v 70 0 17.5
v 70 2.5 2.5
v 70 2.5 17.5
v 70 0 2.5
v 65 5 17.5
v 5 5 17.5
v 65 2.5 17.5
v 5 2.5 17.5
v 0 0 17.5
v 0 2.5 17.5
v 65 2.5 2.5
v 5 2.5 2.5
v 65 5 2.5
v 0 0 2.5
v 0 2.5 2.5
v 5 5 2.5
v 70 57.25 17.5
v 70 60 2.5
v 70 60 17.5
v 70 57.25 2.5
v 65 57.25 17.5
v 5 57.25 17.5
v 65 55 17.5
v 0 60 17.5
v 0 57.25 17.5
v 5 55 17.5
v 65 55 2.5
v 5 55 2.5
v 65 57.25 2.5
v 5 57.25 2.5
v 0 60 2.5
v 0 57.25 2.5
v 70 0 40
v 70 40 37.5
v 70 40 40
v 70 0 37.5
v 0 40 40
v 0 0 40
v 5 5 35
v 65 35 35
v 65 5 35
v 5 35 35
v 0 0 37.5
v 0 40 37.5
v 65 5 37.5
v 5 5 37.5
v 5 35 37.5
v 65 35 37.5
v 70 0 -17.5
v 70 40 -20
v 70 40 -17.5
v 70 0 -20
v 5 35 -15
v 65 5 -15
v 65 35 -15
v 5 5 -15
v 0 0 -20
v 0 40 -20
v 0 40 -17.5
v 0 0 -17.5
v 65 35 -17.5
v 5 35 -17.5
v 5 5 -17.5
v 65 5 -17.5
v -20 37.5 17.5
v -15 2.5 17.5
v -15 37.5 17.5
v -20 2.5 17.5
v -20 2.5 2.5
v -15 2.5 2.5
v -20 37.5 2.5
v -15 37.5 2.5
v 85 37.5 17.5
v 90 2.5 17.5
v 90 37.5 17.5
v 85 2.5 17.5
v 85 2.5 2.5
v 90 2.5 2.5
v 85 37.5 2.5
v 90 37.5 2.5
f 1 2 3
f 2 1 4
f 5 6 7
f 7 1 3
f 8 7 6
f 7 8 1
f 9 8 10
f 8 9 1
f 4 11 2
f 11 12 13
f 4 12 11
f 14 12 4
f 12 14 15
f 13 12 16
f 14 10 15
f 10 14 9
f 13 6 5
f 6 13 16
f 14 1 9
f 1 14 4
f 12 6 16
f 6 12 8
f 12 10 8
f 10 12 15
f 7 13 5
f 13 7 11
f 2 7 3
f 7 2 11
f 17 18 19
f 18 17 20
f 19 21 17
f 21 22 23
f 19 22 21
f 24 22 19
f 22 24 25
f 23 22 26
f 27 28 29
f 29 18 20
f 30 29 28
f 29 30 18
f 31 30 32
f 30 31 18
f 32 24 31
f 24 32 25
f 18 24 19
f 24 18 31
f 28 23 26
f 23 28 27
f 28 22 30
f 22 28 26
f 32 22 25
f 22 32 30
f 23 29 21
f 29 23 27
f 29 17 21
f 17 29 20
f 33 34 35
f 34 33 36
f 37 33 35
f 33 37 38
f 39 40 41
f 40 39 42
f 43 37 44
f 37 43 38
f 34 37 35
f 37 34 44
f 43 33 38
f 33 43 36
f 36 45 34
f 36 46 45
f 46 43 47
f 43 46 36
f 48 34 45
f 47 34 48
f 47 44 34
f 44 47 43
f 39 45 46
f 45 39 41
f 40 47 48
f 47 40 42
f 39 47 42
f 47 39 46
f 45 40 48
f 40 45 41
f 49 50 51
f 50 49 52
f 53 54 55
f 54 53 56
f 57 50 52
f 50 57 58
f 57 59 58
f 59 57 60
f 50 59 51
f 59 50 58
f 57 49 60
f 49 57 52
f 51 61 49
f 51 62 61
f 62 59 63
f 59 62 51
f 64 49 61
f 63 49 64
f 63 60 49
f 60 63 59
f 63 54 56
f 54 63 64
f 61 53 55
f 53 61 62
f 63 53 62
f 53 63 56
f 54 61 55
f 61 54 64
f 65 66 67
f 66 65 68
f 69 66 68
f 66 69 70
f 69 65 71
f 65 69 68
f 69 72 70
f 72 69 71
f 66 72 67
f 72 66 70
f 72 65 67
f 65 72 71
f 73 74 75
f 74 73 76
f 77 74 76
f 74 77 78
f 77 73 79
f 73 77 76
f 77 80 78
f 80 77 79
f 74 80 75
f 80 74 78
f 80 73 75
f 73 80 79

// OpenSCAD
//Please use the Customizer to interact with this (if necessary, show it by clearing the checkbox in front of View | Hide Customizer), and close this Editor window.

/* [Overview] */
//Part
PARTNO = "0"; // [0:All, 1:Front, 2:Back, 3:Left Side, 4:Right Side, 5:Top, 6:Bottom,7:Dividers]

//Endmill Diameter
diameter=3.175;

//Part Spacing
partspacing=4;

/* [Size] */

//Thickness
thickness = 5;

//Width
width = 70;

//Height
height = 20;

//Length
length = 40;

conversionfactor = 1*1;

cwidth = width*conversionfactor;
clength = length*conversionfactor;
cheight = height*conversionfactor;
cthickness = thickness*conversionfactor;
cbottomlidthickness=thickness*conversionfactor;
cpartspacing=partspacing*conversionfactor*5;

cdiameter = diameter*conversionfactor;

cinteriorwidth = cwidth-cthickness*2;
cinteriorlength = clength-cthickness*2;

cinteriorheight=cheight-cbottomlidthickness*2-cthickness;

//Front
module Front() {difference() {
translate([0, 0, cthickness/2]) {    cube(size = [cwidth,cthickness,cheight-cthickness], center = false);}
translate([-cthickness*0.1,cthickness/2,cthickness*0.05])cube(size = [cthickness*1.1,cthickness/2*1.1,cheight], center = false);
translate([cwidth-cthickness,cthickness/2,cthickness*0.05])cube(size = [cthickness*1.1,cthickness/2*1.1,cheight], center = false);
}}

//Back
module Back() {translate([0, clength-cthickness+cpartspacing, cthickness/2]) {
    difference() {
    cube(size = [cwidth,cthickness,cheight-cthickness], center = false);
translate([-cthickness*0.1,-cthickness*0.1,-cthickness*0.05])cube(size = [cthickness*1.1,cthickness/2*1.1,cheight], center = false);
translate([cwidth-cthickness,-cthickness*0.1,-cthickness*0.05])cube(size = [cthickness*1.1,cthickness/2*1.1,cheight], center = false);
    }}}

//LeftSide
module LeftSide() {translate([cthickness-cpartspacing, cthickness/2, cthickness/2]) {
    rotate([0, 0, 90]) {
difference() {
    cube(size = [clength-cthickness,cthickness,cheight-cthickness], center = false);}}}}

//RightSide
module RightSide() {translate([cwidth+cpartspacing, cthickness/2, cthickness/2]) {
    rotate([0, 0, 90]) {
difference() {
    cube(size = [clength-cthickness,cthickness,cheight-cthickness], center = false);}}}}

//Top
module Top() {translate([cthickness-cbottomlidthickness, cthickness-cbottomlidthickness, cheight+cpartspacing-cthickness]) {difference() {
    cube(size = [cwidth-cthickness*2+cbottomlidthickness*2,clength-cthickness*2+cbottomlidthickness*2,cbottomlidthickness], center = false);
translate([-cthickness*0.1,-cthickness*0.1,-cthickness*0.05])cube(size = [cwidth*1.2,cthickness*1.1,cthickness*1.1/2], center = false);
translate([-cthickness*0.1,clength-cthickness,-cthickness*0.05])cube(size = [cwidth*1.2,cthickness*1.1,cthickness*1.1/2], center = false);
translate([-cthickness*0.1,-cthickness*0.1,-cthickness*0.05])cube(size = [cthickness*1.1,clength*1.2,cthickness*1.1/2], center = false);
translate([cwidth-cthickness,-cthickness*0.1,-cthickness*0.05])cube(size = [cthickness*1.1,clength*1.2,cthickness*1.1/2], center = false);
};
};
}

//Bottom
module Bottom() {translate([cthickness-cbottomlidthickness, cthickness-cbottomlidthickness, -cpartspacing]) {difference() {
    cube(size = [cwidth-cthickness*2+cbottomlidthickness*2,clength-cthickness*2+cbottomlidthickness*2,cbottomlidthickness], center = false);
translate([-cthickness*0.1,-cthickness*0.1,cthickness/2])cube(size = [cwidth*1.2,cthickness*1.1,cthickness*1.1/2], center = false);
translate([-cthickness*0.1,clength-cthickness,cthickness/2])cube(size = [cwidth*1.2,cthickness*1.1,cthickness*1.1/2], center = false);
translate([-cthickness*0.1,-cthickness*0.1,cthickness/2])cube(size = [cthickness*1.1,clength*1.2,cthickness*1.1/2], center = false);
translate([cwidth-cthickness,-cthickness*0.1,cthickness/2])cube(size = [cthickness*1.1,clength*1.2,cthickness*1.1/2], center = false);
};
};
};


// [0:All, 1:Front, 2:Back, 3:Left Side, 4:Right Side, 5:Top, 6:Bottom

 if (PARTNO == "1") Front();
 if (PARTNO == "2") Back();
 if (PARTNO == "3") LeftSide();
 if (PARTNO == "4") RightSide();
 if (PARTNO == "5") Top();
 if (PARTNO == "6") Bottom();
       
  // optionally use 0 for whole object
 if (PARTNO == "0") {
   Front();
   Back();
   LeftSide();
   RightSide();
   Top();
   Bottom();
 }
